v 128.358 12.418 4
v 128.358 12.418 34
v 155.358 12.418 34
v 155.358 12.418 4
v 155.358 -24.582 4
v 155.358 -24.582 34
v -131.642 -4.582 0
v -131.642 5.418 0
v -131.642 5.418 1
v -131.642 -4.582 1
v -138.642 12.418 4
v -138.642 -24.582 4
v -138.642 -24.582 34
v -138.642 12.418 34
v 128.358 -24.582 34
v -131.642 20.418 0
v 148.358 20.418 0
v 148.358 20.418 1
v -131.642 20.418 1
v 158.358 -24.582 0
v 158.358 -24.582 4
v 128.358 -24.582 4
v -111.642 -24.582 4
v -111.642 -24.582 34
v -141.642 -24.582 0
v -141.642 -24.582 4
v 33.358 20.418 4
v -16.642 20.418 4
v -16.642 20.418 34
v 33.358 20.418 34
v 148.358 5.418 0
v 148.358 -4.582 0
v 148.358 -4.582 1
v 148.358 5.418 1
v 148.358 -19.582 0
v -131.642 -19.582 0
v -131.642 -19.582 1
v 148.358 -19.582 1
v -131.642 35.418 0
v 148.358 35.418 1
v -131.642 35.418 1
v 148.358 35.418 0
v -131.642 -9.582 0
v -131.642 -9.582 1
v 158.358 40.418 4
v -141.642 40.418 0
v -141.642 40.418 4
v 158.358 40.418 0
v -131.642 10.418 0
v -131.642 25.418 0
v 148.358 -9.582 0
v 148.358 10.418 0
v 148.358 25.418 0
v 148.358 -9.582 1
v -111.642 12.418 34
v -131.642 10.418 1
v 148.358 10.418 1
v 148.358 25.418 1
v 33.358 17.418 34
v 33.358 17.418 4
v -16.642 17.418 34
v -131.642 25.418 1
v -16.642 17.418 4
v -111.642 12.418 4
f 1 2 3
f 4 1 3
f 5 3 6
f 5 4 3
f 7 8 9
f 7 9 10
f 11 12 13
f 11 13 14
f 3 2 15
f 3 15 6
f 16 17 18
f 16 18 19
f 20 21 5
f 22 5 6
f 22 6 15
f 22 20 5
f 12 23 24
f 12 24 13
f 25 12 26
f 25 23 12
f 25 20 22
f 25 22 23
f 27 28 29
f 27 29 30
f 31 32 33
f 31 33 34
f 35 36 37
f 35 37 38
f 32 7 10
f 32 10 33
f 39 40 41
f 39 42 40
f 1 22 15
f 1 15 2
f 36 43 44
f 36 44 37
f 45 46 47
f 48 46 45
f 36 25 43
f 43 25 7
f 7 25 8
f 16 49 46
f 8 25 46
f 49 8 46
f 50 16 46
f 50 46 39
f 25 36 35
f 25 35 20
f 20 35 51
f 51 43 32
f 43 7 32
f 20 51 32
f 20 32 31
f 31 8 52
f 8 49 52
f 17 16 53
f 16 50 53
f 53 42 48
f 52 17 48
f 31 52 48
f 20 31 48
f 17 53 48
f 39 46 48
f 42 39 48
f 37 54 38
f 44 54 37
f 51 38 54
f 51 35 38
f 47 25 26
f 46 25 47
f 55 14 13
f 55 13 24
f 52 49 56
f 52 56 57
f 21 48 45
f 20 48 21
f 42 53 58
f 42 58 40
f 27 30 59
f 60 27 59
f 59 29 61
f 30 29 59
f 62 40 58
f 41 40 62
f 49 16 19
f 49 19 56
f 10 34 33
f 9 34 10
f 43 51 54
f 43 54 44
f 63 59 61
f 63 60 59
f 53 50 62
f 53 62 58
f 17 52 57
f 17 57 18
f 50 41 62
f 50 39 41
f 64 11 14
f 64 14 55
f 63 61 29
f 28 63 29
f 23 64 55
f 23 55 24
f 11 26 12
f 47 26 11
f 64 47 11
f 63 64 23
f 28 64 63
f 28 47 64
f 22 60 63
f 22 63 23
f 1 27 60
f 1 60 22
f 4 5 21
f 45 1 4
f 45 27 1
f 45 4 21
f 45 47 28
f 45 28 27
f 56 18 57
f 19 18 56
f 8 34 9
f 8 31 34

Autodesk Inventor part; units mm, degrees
ref_plane "YZ Plane" through (0, 0, 0) normal (1, 0, 0) x (0, 1, 0)
ref_plane "XZ Plane" through (0, 0, 0) normal (0, 1, 0) x (-1, 0, 0)
ref_plane "XY Plane" through (0, 0, 0) normal (0, 0, 1) x (1, 0, 0)
sketch "Esquisse1" plane through (0, 0, 0) normal (0, 0, 1) x (1, 0, 0)
  line L0 (-141.642, 40.418) -> (158.358, 40.418)
  line L1 (158.358, 40.418) -> (158.358, -24.582)
  line L2 (158.358, -24.582) -> (-141.642, -24.582)
  line L3 (-141.642, -24.582) -> (-141.642, 40.418)
  point P0 (0, 0)
  dimension "d0" = 300
  dimension "d1" = 65
extrude "Extrusion1" add sketch "Esquisse1" along normal blind 4
sketch "Esquisse2" plane through (0, 0, 4) normal (0, 0, 1) x (1, 0, 0)
  line L0 (-141.642, -24.582) -> (158.358, -24.582) projected
  line L1 (-138.642, 12.418) -> (-111.642, 12.418)
  line L2 (-111.642, 12.418) -> (-111.642, -24.582)
  line L3 (-111.642, -24.582) -> (-138.642, -24.582)
  line L4 (-138.642, -24.582) -> (-138.642, 12.418)
  line L5 (128.358, 12.418) -> (155.358, 12.418)
  line L6 (155.358, 12.418) -> (155.358, -24.582)
  line L7 (155.358, -24.582) -> (128.358, -24.582)
  line L8 (128.358, -24.582) -> (128.358, 12.418)
  line L9 (158.358, -24.582) -> (158.358, 40.418) projected
  line L10 (-141.642, 40.418) -> (-141.642, -24.582) projected
  point P0 (0, 0)
  dimension "d34" = 270
  dimension "d36" = 270
  dimension "d37" = 27
  dimension "d38" = 27
  dimension "d39" = 0
  dimension "d40" = 0
  dimension "d41" = 37
extrude "Extrusion2" add sketch "Esquisse2" along normal blind 30
sketch "Esquisse3" plane through (0, 0, 0) normal (0, 0, -1) x (-1, 0, 0)
  line L0 (-148.358, 35.418) -> (131.642, 35.418)
  line L1 (131.642, 35.418) -> (131.642, 25.418)
  line L2 (131.642, 25.418) -> (-148.358, 25.418)
  line L3 (-148.358, 25.418) -> (-148.358, 35.418)
  line L4 (-148.358, 20.418) -> (131.642, 20.418)
  line L5 (131.642, 20.418) -> (131.642, 10.418)
  line L6 (131.642, 10.418) -> (-148.358, 10.418)
  line L7 (-148.358, 10.418) -> (-148.358, 20.418)
  line L8 (-158.358, 40.418) -> (141.642, 40.418) projected
  line L9 (-148.358, 5.418) -> (131.642, 5.418)
  line L10 (131.642, 5.418) -> (131.642, -4.582)
  line L11 (131.642, -4.582) -> (-148.358, -4.582)
  line L12 (-148.358, -4.582) -> (-148.358, 5.418)
  line L13 (-148.358, -9.582) -> (131.642, -9.582)
  line L14 (131.642, -9.582) -> (131.642, -19.582)
  line L15 (131.642, -19.582) -> (-148.358, -19.582)
  line L16 (-148.358, -19.582) -> (-148.358, -9.582)
  line L17 (141.642, -24.582) -> (-158.358, -24.582) projected
  line L18 (-158.358, -24.582) -> (-158.358, 40.418) projected
  dimension "d14" = 5
  dimension "d15" = 10
  dimension "d16" = 5
  dimension "d17" = 10
  dimension "d20" = 5
  dimension "d21" = 10
  dimension "d22" = 5
  dimension "d23" = 10
  dimension "d24" = 280
  dimension "d25" = 280
  dimension "d26" = 280
  dimension "d27" = 280
  dimension "d28" = 10
  dimension "d29" = 10
  dimension "d30" = 10
  dimension "d31" = 10
extrude "Extrusion3" cut sketch "Esquisse3" against normal blind 1
sketch "Esquisse4" plane through (0, 0, 4) normal (0, 0, 1) x (1, 0, 0)
  line L0 (-16.642, 20.418) -> (33.358, 20.418)
  line L1 (33.358, 20.418) -> (33.358, 17.418)
  line L2 (33.358, 17.418) -> (-16.642, 17.418)
  line L3 (-16.642, 17.418) -> (-16.642, 20.418)
  line L4 (-111.642, -24.582) -> (128.358, -24.582) projected
  line L5 (158.358, -24.582) -> (158.358, 40.418) projected
  point P0 (0, 0)
  dimension "d42" = 42
  dimension "d43" = 3
  dimension "d44" = 50
  dimension "d45" = 125
extrude "Extrusion4" add sketch "Esquisse4" along normal blind 30
properties part number "pièce_chassis"
